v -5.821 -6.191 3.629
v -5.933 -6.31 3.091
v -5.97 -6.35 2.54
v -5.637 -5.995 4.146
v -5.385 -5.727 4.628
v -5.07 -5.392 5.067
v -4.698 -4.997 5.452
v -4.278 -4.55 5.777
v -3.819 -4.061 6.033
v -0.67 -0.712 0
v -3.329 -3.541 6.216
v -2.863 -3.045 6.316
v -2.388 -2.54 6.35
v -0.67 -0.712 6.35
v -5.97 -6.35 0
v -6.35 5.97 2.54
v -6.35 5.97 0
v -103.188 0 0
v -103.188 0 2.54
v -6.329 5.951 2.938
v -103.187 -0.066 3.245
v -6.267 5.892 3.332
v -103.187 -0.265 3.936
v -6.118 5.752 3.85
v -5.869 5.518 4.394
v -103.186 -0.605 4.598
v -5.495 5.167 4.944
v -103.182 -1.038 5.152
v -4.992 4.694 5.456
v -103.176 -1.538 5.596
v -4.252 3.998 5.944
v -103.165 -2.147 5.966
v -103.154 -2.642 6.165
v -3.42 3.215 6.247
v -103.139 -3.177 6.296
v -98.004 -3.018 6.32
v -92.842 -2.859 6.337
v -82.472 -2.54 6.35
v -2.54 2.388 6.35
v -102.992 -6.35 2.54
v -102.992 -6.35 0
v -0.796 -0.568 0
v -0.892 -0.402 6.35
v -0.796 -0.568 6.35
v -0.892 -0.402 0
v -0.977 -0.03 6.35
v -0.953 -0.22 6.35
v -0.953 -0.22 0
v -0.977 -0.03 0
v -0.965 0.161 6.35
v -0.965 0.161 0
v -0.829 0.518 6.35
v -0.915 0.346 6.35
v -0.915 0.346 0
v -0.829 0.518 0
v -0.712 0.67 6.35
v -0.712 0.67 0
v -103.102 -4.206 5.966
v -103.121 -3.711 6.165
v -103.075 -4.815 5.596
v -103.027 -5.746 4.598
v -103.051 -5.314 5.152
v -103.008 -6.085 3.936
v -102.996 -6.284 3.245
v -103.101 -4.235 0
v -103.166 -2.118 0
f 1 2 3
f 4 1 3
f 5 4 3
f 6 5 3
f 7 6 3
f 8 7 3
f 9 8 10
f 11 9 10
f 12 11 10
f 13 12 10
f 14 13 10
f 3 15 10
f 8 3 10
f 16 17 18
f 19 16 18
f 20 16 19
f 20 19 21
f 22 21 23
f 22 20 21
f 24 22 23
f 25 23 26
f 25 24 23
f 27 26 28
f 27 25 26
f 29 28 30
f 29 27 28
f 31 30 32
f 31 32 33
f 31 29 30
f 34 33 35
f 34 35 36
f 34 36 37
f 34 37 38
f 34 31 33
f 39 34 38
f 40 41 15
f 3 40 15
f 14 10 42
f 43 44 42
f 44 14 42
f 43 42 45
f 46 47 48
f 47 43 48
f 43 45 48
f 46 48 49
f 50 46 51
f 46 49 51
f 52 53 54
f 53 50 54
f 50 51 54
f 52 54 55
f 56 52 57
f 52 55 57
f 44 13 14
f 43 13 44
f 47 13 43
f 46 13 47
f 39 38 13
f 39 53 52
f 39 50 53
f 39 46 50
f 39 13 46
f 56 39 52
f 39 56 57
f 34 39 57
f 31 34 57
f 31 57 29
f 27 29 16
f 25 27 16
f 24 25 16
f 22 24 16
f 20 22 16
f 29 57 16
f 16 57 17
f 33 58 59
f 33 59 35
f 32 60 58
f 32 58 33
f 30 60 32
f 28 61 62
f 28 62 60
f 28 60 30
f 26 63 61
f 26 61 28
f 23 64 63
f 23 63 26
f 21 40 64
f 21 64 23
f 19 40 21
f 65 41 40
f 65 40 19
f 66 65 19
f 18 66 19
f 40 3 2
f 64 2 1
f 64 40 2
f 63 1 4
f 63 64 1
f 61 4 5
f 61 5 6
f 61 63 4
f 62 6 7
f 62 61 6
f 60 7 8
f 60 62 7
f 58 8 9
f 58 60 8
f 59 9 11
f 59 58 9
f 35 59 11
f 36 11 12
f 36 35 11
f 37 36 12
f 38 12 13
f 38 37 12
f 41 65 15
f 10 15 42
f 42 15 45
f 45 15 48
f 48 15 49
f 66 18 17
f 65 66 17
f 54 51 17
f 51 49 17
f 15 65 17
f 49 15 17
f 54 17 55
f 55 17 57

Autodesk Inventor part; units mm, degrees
ref_plane "YZ Plane" through (0, 0, 0) normal (1, 0, 0) x (0, 1, 0)
ref_plane "XZ Plane" through (0, 0, 0) normal (0, 1, 0) x (-1, 0, 0)
ref_plane "XY Plane" through (0, 0, 0) normal (0, 0, 1) x (1, 0, 0)
sketch "Sketch1" plane through (0, 0, 0) normal (0, 0, 1) x (1, 0, 0)
  line L0 (-0.7124, 0.6699) -> (-6.35, 5.9705)
  line L1 (-6.35, 5.9705) -> (-103.1875, 0)
  line L2 (-102.9919, -6.35) -> (-5.9705, -6.35)
  line L3 (-5.9705, -6.35) -> (-0.6699, -0.7124)
  arc A0 (-103.1875, 0) -> (-102.9919, -6.35) centre (0, 0) ccw
  arc A1 (-0.7124, 0.6699) -> (-0.6699, -0.7124) centre (0, 0) ccw
  line L4 (0, 0) -> (-0.7124, 0.6699) construction
  line L5 (0, 0) -> (-0.6699, -0.7124) construction
  dimension "d0" = 103.1875
  dimension "d1" = 6.35
  dimension "d2" = 103.1875
  dimension "d3" = 6.35
  dimension "d7" = 1.9558
extrude "Extrusion1" add sketch "Sketch1" along normal blind 6.35
fillet "Fillet2" radius 3.81 2 edges at (-54.4812, -6.35, 6.35) (-54.7687, 2.9853, 6.35)
properties part number "Thrust_Support"
